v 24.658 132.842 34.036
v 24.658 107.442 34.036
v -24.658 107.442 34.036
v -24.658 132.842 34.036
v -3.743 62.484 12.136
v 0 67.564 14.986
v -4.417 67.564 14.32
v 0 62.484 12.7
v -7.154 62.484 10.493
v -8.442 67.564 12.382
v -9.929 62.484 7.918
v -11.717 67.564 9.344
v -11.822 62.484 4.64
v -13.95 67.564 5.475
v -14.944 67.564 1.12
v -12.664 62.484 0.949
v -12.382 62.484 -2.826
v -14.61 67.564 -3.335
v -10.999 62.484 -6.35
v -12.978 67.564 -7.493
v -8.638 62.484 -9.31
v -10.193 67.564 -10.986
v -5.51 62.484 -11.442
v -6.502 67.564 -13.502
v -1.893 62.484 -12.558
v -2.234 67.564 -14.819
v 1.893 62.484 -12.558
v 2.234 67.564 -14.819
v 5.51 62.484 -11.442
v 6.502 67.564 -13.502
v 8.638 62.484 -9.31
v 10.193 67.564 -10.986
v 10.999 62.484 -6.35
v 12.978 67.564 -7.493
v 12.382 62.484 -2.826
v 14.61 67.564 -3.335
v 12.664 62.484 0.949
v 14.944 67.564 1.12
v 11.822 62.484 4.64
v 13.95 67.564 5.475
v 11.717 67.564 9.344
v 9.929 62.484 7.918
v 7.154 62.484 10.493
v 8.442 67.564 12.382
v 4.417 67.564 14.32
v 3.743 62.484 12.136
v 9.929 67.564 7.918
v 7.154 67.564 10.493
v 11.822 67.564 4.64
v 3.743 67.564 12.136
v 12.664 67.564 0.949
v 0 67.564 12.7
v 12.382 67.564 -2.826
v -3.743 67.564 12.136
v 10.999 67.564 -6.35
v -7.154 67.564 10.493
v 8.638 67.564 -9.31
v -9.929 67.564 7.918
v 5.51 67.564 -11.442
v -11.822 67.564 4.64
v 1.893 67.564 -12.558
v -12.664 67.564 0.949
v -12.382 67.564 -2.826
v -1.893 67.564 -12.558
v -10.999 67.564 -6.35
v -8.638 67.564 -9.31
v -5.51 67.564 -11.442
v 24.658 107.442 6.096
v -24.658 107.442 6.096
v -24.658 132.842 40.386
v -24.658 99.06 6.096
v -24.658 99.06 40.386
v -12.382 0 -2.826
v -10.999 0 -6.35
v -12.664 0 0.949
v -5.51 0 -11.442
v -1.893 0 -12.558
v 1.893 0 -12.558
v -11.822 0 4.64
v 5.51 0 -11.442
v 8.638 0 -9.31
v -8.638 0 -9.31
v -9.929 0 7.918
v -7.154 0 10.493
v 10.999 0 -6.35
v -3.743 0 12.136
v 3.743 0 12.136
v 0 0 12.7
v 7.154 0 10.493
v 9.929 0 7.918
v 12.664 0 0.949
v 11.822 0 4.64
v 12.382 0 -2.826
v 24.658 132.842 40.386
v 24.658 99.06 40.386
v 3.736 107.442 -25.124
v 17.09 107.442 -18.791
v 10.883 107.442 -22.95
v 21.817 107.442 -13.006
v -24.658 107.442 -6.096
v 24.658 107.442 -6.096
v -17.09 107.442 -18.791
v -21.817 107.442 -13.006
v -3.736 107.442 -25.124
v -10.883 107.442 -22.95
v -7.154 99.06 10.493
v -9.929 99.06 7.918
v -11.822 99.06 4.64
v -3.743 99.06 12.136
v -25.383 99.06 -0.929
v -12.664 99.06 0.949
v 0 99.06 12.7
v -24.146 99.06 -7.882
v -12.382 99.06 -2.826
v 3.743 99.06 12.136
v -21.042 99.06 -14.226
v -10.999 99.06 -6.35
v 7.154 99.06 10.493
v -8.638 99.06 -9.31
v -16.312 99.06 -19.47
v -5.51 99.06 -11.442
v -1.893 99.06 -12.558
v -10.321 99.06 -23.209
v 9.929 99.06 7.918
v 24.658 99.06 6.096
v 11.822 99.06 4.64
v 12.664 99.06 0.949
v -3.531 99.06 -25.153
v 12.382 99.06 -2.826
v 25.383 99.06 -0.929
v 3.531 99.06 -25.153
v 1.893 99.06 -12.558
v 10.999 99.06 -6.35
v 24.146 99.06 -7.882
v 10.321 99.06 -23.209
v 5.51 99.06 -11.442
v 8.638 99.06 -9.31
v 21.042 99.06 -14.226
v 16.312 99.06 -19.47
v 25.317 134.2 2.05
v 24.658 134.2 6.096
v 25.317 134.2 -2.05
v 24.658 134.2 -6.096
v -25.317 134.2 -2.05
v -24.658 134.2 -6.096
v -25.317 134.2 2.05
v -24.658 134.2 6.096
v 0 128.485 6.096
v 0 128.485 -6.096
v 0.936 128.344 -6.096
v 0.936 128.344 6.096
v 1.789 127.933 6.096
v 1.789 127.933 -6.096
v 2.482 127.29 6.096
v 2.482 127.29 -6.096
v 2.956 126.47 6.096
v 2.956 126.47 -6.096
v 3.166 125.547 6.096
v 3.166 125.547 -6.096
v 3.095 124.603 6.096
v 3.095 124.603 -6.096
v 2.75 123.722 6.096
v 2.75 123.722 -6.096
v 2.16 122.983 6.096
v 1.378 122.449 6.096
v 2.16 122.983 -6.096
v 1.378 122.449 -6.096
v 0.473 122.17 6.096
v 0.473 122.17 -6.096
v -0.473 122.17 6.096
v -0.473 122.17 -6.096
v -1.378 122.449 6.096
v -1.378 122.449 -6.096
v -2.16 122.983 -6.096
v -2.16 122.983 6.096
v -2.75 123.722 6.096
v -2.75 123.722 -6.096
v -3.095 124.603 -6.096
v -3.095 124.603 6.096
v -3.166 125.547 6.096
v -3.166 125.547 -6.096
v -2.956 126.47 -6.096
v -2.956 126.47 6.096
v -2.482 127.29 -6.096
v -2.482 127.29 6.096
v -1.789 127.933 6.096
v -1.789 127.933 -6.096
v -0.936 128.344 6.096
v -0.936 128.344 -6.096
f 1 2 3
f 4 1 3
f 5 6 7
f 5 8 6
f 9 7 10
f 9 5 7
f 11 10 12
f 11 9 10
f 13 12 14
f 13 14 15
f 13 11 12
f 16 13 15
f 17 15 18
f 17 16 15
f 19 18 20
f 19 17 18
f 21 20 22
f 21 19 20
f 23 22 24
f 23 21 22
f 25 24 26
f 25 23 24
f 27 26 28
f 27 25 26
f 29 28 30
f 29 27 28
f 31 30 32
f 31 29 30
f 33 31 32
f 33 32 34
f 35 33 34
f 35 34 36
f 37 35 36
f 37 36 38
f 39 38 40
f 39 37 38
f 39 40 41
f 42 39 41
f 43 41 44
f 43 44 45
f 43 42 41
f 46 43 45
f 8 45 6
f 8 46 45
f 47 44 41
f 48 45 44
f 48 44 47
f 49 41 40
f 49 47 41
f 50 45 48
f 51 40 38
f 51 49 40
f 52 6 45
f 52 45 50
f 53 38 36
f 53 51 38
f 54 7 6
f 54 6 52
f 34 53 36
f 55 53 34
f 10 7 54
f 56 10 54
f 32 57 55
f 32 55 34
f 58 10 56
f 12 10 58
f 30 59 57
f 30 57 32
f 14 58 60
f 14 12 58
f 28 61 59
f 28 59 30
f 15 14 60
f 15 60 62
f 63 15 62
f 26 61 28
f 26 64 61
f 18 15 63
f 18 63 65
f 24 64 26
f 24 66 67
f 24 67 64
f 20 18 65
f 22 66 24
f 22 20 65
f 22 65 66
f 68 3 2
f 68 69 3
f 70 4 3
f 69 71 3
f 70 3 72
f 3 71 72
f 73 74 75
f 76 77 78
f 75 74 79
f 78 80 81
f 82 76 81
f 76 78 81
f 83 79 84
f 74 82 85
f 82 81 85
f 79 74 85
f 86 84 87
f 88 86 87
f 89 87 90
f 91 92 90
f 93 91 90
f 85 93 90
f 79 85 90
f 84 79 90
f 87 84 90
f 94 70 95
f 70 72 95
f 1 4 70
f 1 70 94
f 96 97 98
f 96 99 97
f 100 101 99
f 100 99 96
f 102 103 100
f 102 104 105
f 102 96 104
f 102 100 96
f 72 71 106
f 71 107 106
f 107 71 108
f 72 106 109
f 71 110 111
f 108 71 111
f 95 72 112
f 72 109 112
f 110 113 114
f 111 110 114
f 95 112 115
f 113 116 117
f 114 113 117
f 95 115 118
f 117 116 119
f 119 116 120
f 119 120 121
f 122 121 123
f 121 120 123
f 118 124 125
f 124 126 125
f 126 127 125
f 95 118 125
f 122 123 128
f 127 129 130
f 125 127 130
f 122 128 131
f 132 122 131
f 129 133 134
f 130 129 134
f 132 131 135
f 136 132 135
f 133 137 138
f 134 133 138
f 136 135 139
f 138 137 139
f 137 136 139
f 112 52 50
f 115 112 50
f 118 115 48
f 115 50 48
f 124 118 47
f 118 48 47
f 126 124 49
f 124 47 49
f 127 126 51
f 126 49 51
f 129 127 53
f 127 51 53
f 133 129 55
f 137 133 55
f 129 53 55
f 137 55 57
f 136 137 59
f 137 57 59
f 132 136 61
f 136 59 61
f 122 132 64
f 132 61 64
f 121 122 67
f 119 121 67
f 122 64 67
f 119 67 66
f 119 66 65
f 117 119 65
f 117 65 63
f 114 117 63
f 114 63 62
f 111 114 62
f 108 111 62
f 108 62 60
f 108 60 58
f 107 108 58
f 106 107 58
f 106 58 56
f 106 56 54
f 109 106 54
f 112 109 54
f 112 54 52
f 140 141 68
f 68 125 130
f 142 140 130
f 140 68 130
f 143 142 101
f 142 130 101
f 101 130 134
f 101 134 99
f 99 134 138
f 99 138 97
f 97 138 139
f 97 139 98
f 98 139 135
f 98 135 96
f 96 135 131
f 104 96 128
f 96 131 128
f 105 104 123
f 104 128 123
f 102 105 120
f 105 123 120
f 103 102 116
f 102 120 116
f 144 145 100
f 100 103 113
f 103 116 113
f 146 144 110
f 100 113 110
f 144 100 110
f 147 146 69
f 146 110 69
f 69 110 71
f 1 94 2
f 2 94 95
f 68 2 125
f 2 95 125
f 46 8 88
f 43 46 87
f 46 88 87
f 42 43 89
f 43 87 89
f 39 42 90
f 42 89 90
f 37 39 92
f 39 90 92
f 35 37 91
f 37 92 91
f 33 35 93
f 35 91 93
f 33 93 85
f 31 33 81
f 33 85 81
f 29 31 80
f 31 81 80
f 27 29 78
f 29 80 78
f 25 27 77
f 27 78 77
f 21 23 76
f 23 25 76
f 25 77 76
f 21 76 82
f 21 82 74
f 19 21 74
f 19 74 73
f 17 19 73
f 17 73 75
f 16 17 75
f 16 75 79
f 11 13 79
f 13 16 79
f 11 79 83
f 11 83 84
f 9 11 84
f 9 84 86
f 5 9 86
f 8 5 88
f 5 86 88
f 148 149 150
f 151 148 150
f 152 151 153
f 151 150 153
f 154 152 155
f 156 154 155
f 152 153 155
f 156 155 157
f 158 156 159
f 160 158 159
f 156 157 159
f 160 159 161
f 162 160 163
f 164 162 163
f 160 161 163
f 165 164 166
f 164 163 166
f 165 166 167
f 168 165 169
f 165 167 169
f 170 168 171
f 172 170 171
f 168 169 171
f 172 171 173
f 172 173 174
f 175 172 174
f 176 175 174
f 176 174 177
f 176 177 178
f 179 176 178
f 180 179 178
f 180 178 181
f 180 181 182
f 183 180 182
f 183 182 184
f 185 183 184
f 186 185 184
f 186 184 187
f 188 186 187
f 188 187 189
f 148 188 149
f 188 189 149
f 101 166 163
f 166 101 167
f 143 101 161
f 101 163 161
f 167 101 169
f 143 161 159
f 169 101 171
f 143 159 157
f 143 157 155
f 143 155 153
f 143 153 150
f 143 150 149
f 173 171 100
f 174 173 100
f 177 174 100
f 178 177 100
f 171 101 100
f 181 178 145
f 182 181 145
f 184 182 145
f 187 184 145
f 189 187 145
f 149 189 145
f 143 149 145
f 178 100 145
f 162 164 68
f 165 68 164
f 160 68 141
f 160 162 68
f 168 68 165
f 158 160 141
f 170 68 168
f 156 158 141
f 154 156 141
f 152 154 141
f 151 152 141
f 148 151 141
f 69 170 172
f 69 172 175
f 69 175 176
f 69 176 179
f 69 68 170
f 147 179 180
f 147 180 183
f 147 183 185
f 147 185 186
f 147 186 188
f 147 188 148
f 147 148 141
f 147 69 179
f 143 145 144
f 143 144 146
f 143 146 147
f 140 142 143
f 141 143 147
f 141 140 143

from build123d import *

# Parameters (mm, degrees)
SKETCH1_R                      = 12.7
PART_THAT_GOES_INTO_BASE_DEPTH = 99.06
SKETCH3_R                      = 25.4
BOSS_EXTRUDE2_DEPTH            = 35.14
CUT_EXTRUDE1_START             = -75.457631354
CUT_EXTRUDE1_OUTLINE_W         = 19.304
CUT_EXTRUDE1_OUTLINE_H         = 26.758
CUT_EXTRUDE1_DEPTH             = 49.315262708
BOSS_EXTRUDE3_START            = -8.382
BOSS_EXTRUDE3_DEPTH            = 8.382
BOSS_EXTRUDE4_DEPTH            = 25.4
SKETCH7_R                      = 3.175
CUT_EXTRUDE2_DEPTH             = 12.192


# Read off the part's stored shape, not the designer's step: Cut-Extrude1
with BuildPart() as part:
    # Sketch1 → Part that goes into base (new body)
    with BuildSketch(Plane(origin=(0, 0, 0), x_dir=(1, 0, 0), z_dir=(0, 1, 0))):
        with Locations(Location((0, 0, 0), (0, 0, 270))):
            Circle(SKETCH1_R)
    extrude(amount=PART_THAT_GOES_INTO_BASE_DEPTH)

    # Sketch2 → Clip in mechanism (revolve)
    with BuildSketch(Plane.XY, mode=Mode.PRIVATE) as clip_in_mechanism_sk:
        Polygon((12.7, 62.484), (12.7, 67.564), (14.986, 67.564), align=None)
    revolve(clip_in_mechanism_sk.sketch.rotate(Axis((0, 99.06, 0), (0, -1, 0)), 90), axis=Axis((0, 99.06, 0), (0, -1, 0)))

    # Sketch3 → Boss-Extrude2 (add)
    with BuildSketch(Plane(origin=(0, 99.06, 0), x_dir=(1, 0, 0), z_dir=(0, 1, 0))):
        with Locations(Location((0, 0, 0), (0, 0, 270))):
            Circle(SKETCH3_R)
    extrude(amount=BOSS_EXTRUDE2_DEPTH)

    # Cut-Extrude1 outline → Cut-Extrude1 (cut)
    with BuildSketch(Plane(origin=(50.8, 0, 0), x_dir=(0, 0, -1), z_dir=(1, 0, 0)).offset(CUT_EXTRUDE1_START)):
        with Locations((15.748, 120.821)):
            Rectangle(CUT_EXTRUDE1_OUTLINE_W, CUT_EXTRUDE1_OUTLINE_H)
        with Locations((-15.748, 120.821)):
            Rectangle(CUT_EXTRUDE1_OUTLINE_W, CUT_EXTRUDE1_OUTLINE_H)
    extrude(amount=CUT_EXTRUDE1_DEPTH, mode=Mode.SUBTRACT)

    # Sketch5 → Boss-Extrude3 (add)
    with BuildSketch(Plane(origin=(0, 107.442, 0), x_dir=(1, 0, 0), z_dir=(0, 1, 0)).offset(BOSS_EXTRUDE3_START)):
        with BuildLine():
            Line((24.657631354, -40.386), (24.657631354, -6.096))
            ThreePointArc((24.657631354, -6.096), (0, -25.4), (-24.657631354, -6.096))
            Line((-24.657631354, -6.096), (-24.657631354, -40.386))
            Line((-24.657631354, -40.386), (24.657631354, -40.386))
        make_face()
    extrude(amount=BOSS_EXTRUDE3_DEPTH)

    # Sketch6 → Boss-Extrude4 (add)
    with BuildSketch(Plane(origin=(0, 107.442, 0), x_dir=(1, 0, 0), z_dir=(0, 1, 0))):
        Polygon((5.242487602, -34.036), (-7.020096484, -34.036), (-24.657631354, -34.036), (-24.657631354, -40.386), (24.657631354, -40.386), (24.657631354, -34.036), align=None)
    extrude(amount=BOSS_EXTRUDE4_DEPTH)

    # Sketch7 → Cut-Extrude2 (cut)
    with BuildSketch(Plane(origin=(0, 0, -6.096), x_dir=(-1, 0, 0), z_dir=(0, 0, -1))):
        with Locations(Location((0, 125.31, 0), (0, 0, 90))):
            Circle(SKETCH7_R)
    extrude(amount=-CUT_EXTRUDE2_DEPTH, mode=Mode.SUBTRACT)


solid = part.part
